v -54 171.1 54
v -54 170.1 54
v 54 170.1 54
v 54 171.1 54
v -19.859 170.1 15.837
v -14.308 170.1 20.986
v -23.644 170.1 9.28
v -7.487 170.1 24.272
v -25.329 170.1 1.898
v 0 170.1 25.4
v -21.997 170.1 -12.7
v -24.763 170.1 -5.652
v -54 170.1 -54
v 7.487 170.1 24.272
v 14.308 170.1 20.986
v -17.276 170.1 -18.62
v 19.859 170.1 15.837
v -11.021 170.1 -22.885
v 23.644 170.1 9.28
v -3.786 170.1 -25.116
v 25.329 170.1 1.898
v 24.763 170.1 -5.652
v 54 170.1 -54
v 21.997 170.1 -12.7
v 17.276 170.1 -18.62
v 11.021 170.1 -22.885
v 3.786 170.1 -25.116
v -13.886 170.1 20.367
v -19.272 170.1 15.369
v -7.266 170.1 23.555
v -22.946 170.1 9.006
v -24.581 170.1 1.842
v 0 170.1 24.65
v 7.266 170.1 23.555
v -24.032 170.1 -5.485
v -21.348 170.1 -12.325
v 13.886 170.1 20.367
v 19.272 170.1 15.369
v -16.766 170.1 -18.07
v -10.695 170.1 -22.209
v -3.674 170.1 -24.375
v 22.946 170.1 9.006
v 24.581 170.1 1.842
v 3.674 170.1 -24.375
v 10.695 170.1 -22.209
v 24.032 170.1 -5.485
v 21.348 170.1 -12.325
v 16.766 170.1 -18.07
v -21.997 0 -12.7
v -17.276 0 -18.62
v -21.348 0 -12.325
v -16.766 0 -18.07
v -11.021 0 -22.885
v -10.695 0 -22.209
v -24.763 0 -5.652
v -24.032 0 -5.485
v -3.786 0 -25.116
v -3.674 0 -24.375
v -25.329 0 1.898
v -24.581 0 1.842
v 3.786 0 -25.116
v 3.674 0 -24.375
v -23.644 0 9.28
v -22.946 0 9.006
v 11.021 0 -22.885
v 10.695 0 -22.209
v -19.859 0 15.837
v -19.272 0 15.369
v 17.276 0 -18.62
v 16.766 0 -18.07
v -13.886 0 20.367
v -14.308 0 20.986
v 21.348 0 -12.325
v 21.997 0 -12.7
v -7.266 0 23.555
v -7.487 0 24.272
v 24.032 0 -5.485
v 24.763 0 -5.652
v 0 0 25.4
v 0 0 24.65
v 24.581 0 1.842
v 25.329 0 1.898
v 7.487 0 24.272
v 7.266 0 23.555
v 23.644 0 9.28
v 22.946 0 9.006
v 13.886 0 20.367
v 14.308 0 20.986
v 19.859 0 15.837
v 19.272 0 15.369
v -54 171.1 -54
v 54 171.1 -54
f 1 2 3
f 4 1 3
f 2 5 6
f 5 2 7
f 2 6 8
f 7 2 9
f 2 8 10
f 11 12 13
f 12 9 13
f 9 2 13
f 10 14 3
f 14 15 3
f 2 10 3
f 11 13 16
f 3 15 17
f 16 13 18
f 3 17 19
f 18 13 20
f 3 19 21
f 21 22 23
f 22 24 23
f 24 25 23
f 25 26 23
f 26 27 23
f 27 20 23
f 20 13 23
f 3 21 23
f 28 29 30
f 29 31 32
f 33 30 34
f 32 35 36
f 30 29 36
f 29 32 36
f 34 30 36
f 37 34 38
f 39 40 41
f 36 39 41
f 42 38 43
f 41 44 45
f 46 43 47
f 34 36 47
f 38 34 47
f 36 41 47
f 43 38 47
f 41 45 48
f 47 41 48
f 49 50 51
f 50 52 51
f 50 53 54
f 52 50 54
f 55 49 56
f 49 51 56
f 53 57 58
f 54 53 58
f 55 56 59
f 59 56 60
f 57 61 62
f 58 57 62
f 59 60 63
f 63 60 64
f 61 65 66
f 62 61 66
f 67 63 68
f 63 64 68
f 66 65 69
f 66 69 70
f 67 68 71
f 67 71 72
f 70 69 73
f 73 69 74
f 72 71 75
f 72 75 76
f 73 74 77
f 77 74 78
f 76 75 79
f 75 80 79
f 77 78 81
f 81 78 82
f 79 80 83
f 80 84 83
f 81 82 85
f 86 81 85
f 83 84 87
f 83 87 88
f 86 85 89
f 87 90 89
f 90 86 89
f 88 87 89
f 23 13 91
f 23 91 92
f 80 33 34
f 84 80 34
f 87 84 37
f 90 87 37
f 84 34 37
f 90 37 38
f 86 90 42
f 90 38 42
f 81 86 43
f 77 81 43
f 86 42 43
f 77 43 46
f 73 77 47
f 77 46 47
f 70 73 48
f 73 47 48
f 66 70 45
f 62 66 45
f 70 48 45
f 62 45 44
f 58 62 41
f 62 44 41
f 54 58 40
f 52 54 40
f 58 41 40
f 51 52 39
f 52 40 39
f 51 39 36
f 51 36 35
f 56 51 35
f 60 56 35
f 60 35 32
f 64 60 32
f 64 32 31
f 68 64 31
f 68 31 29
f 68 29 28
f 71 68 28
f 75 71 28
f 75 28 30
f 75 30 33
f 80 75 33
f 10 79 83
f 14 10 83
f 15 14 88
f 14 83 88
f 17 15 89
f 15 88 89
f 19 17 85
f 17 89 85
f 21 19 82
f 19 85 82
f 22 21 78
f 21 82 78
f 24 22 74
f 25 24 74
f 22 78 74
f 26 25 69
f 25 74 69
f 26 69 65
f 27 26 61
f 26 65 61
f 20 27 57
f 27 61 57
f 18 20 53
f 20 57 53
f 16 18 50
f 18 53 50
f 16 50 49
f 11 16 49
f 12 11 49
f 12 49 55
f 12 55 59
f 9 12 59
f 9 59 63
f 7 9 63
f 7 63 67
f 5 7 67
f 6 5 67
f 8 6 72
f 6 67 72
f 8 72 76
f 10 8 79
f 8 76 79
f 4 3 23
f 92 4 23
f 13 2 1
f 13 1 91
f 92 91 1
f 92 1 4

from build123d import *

# Parameters (mm, degrees)
SKETCH1_R           = 25.4
BOSS_EXTRUDE1_DEPTH = 170.1
SKETCH2_R           = 24.65
CUT_EXTRUDE1_DEPTH  = 174.851459585
SKETCH3_W           = 108
SKETCH3_H           = 108
BOSS_EXTRUDE2_DEPTH = 1


with BuildPart() as part:
    # Sketch1 → Boss-Extrude1 (new body)
    with BuildSketch(Plane(origin=(0, 0, 0), x_dir=(1, 0, 0), z_dir=(0, 1, 0))):
        with Locations(Location((0, 0, 0), (0, 0, 270))):
            Circle(SKETCH1_R)
    extrude(amount=BOSS_EXTRUDE1_DEPTH)

    # Sketch2 → Cut-Extrude1 (cut, through all)
    with BuildSketch(Plane(origin=(0, 170.1, 0), x_dir=(1, 0, 0), z_dir=(0, 1, 0))):
        with Locations(Location((0, 0, 0), (0, 0, 270))):
            Circle(SKETCH2_R)
    extrude(amount=-CUT_EXTRUDE1_DEPTH, mode=Mode.SUBTRACT)

    # Sketch3 → Boss-Extrude2 (add)
    with BuildSketch(Plane(origin=(0, 170.1, 0), x_dir=(1, 0, 0), z_dir=(0, 1, 0))):
        Rectangle(SKETCH3_W, SKETCH3_H)
    extrude(amount=BOSS_EXTRUDE2_DEPTH)


solid = part.part
